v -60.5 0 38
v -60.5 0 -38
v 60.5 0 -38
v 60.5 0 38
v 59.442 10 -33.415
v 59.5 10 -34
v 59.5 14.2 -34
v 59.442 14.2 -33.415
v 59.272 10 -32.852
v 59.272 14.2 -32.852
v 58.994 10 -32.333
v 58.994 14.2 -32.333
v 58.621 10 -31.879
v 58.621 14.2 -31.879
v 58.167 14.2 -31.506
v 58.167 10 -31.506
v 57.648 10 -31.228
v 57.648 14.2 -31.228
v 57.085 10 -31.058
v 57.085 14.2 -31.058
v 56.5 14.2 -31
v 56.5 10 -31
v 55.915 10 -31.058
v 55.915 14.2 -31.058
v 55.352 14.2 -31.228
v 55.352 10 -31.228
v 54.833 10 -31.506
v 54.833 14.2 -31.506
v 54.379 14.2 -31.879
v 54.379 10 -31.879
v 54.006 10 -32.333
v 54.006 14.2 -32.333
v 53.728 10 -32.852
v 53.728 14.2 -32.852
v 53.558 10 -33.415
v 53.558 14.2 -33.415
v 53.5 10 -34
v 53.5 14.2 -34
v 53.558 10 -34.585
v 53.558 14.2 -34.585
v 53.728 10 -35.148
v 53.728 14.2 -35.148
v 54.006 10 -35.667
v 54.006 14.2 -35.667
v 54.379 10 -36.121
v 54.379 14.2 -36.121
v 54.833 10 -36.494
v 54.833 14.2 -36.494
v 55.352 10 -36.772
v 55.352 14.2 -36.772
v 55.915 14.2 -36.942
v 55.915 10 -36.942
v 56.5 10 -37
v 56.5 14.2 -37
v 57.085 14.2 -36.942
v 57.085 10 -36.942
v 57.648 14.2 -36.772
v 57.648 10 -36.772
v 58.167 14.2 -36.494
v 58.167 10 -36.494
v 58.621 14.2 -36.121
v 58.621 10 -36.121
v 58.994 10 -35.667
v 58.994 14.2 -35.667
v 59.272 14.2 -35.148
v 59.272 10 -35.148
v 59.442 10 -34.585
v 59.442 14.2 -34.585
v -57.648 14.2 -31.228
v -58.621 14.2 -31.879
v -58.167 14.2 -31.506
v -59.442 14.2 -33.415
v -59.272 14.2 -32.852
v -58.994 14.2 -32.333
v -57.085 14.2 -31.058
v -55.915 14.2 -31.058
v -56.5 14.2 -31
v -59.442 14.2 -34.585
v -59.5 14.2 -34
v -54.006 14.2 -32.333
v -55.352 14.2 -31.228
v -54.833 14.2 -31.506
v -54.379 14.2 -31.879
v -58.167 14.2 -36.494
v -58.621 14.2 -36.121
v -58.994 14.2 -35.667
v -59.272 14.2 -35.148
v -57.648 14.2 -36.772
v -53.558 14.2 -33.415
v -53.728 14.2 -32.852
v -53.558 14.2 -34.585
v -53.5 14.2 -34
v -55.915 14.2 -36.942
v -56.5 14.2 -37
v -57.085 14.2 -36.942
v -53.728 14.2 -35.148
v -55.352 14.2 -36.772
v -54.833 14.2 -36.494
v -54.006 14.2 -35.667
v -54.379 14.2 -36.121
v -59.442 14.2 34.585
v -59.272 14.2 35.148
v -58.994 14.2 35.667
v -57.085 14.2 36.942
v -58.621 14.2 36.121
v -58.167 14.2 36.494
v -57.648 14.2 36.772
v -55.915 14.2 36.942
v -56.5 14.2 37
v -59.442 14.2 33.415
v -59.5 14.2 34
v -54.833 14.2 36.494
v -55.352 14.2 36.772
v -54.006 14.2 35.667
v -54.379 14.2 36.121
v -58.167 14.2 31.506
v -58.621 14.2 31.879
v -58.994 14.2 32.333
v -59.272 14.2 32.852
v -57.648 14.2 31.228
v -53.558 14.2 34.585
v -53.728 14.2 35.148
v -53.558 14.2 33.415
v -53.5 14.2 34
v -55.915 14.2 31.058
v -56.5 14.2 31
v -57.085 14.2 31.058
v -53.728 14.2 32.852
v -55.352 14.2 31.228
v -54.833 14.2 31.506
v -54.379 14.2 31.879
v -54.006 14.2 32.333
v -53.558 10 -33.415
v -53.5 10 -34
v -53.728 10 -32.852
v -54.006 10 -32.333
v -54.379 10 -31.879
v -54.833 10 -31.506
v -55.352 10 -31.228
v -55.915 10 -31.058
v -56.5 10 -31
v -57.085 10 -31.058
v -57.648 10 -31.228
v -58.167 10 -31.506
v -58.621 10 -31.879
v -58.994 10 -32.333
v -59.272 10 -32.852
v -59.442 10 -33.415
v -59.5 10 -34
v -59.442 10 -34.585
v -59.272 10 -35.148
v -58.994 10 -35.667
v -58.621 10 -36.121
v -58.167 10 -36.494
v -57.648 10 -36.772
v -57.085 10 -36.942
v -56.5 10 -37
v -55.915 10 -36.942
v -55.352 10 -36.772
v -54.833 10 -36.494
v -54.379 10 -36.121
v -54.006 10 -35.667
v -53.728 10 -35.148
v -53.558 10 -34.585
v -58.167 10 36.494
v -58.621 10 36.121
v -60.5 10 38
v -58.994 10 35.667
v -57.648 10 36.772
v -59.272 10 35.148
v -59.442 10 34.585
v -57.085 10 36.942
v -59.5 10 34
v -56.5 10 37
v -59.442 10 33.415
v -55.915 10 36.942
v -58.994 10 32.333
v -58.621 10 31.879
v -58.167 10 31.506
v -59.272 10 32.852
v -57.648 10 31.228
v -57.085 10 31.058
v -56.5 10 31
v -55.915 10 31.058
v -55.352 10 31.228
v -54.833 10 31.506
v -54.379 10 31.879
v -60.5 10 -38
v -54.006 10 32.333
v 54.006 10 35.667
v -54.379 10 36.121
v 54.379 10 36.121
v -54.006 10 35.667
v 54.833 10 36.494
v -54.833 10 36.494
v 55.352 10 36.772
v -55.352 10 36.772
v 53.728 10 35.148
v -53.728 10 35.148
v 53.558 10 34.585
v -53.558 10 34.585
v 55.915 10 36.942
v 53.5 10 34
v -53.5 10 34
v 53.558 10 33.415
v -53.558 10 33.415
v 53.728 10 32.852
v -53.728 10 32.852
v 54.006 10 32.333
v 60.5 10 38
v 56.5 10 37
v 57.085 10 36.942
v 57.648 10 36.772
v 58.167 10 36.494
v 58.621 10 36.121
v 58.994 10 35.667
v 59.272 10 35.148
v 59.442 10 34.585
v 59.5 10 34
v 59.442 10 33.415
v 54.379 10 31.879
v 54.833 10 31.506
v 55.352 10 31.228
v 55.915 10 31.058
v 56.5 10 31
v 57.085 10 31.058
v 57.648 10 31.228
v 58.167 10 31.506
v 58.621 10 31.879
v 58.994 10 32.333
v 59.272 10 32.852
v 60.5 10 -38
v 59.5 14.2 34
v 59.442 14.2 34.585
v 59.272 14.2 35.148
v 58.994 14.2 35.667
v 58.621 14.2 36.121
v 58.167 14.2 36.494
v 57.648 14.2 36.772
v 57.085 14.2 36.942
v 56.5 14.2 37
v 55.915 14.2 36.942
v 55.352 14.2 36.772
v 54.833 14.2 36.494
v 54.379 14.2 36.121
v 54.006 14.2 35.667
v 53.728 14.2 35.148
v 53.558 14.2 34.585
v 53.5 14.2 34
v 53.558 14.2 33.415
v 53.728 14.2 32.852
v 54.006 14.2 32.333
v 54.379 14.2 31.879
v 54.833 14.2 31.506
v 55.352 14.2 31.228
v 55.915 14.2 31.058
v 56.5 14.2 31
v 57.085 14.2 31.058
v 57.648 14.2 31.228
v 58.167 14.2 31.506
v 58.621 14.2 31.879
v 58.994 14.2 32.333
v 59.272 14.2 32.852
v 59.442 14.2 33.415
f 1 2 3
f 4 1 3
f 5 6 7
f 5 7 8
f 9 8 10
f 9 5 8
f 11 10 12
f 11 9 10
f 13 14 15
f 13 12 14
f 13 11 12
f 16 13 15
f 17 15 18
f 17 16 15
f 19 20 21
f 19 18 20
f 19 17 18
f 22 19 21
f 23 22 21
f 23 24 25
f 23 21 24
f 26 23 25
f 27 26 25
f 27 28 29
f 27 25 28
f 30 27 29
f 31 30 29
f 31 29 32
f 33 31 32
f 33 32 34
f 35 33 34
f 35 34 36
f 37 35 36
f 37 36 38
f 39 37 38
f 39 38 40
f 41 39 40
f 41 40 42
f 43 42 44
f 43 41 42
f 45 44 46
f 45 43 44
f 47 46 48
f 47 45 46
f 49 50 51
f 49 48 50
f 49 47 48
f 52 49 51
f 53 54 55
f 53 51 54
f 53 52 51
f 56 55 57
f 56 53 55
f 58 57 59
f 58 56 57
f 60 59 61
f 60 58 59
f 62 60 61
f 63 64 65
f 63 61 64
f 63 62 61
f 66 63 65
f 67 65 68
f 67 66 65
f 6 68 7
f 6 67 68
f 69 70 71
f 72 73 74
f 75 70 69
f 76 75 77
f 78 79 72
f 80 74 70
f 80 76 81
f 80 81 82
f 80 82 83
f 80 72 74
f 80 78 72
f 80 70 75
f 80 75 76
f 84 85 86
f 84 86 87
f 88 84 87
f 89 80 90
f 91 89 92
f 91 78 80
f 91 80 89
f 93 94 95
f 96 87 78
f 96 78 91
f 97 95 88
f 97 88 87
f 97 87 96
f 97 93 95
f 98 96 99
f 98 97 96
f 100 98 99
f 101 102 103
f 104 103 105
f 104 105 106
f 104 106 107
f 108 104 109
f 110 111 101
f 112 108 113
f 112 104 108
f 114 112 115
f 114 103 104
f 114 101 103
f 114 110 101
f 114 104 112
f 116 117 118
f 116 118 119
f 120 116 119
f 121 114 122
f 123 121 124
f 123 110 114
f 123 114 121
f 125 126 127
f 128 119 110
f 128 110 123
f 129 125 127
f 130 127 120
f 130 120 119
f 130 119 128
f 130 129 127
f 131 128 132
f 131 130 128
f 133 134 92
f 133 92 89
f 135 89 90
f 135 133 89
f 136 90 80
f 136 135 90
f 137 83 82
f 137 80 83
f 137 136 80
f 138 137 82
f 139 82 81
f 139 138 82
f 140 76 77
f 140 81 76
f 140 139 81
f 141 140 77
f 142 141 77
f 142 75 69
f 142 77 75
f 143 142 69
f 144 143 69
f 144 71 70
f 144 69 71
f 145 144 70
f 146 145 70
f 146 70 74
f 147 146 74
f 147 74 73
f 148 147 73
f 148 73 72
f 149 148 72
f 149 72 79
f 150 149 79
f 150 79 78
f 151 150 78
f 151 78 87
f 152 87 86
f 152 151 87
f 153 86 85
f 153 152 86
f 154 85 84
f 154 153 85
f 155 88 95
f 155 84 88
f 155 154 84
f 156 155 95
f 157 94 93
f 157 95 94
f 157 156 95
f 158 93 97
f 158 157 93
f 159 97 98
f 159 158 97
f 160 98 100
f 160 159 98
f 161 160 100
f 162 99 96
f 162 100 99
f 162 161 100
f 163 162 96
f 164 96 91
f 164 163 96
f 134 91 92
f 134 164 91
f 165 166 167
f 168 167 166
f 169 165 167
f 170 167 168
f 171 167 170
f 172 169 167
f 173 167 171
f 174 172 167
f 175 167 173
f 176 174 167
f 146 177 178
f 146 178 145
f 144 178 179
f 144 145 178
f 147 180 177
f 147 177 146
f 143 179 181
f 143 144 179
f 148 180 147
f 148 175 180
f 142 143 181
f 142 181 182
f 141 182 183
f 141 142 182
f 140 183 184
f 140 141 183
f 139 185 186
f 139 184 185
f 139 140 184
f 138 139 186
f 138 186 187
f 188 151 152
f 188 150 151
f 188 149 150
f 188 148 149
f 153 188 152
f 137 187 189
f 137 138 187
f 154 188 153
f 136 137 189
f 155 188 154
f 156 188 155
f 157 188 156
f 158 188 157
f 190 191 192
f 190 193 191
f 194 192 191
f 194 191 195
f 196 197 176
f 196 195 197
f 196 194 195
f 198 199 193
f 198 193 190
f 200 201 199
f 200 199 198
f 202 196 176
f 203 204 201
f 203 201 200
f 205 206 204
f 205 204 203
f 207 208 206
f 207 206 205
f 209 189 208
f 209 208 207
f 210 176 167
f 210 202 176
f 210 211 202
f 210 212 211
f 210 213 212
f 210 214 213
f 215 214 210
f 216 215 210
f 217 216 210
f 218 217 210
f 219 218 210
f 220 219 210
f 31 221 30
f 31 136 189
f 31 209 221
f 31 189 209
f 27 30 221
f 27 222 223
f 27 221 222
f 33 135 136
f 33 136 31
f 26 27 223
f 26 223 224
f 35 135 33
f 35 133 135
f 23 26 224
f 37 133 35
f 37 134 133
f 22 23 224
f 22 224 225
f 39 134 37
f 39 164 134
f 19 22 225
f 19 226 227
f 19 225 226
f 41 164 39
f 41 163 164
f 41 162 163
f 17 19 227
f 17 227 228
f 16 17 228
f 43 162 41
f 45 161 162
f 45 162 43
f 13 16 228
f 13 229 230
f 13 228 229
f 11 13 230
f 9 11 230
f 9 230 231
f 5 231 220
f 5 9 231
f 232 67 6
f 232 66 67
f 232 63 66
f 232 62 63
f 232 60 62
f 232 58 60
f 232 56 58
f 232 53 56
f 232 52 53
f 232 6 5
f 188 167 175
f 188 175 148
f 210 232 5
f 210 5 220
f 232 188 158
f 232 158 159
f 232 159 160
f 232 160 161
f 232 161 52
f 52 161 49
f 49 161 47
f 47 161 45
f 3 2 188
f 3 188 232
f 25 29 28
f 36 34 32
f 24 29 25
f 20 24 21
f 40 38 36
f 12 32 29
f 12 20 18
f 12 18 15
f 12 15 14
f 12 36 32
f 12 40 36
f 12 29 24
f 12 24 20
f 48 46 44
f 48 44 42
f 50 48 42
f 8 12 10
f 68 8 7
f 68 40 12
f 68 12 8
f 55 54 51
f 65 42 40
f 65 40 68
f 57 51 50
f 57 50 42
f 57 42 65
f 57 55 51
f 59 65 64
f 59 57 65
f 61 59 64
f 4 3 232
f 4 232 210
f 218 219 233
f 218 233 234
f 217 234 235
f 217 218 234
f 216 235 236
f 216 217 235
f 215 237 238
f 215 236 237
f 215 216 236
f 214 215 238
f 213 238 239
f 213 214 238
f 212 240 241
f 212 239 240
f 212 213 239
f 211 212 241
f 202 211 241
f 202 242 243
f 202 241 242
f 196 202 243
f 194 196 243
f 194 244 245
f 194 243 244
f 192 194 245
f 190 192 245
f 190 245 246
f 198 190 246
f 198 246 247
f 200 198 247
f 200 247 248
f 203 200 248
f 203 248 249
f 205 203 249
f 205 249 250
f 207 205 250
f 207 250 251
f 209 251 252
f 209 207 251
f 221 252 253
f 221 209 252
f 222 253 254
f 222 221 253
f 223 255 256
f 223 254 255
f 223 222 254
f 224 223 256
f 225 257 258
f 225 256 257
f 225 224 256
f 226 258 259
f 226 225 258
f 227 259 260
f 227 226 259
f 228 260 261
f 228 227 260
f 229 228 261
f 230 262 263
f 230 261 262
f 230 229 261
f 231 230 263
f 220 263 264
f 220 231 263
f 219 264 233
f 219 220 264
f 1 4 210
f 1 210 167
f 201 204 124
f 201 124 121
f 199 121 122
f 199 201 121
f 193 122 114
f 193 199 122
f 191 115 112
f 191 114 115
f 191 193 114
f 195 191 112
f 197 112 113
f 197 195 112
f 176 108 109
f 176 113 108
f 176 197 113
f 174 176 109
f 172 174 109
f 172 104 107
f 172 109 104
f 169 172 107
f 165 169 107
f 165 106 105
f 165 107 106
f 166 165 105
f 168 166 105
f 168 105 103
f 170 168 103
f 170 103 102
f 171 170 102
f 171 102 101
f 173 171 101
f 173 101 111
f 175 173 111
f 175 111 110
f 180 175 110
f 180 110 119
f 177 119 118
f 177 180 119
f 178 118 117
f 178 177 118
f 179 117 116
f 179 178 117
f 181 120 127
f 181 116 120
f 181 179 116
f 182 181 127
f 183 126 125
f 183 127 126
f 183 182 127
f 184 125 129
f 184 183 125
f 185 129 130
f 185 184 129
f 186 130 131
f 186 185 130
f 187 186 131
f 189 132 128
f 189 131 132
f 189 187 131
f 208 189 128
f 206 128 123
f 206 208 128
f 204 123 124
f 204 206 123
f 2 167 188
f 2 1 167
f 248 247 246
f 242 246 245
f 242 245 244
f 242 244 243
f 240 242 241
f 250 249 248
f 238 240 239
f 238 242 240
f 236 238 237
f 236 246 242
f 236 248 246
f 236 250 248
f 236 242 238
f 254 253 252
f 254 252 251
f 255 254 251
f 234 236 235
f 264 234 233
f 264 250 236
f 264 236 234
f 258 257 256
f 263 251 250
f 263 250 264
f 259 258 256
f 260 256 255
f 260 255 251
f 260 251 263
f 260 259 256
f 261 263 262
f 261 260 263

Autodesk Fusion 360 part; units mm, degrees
sketch "Sketch1" plane through (0, 0, 0) normal (0, 1, 0) x (1, 0, 0)
  line L0 (60.5, -38) -> (-60.5, -38)
  line L1 (-60.5, -38) -> (-60.5, 38)
  line L2 (-60.5, 38) -> (60.5, 38)
  line L3 (60.5, 38) -> (60.5, -38)
  line L4 (60.5, -38) -> (-60.5, 38) construction
  line L5 (-60.5, -38) -> (60.5, 38) construction
  line L6 (56.5, -34) -> (-56.5, -34) construction
  line L7 (-56.5, -34) -> (-56.5, 34) construction
  line L8 (-56.5, 34) -> (56.5, 34) construction
  line L9 (56.5, 34) -> (56.5, -34) construction
  line L10 (56.5, -34) -> (-56.5, 34) construction
  line L11 (-56.5, -34) -> (56.5, 34) construction
  circle A0 centre (56.5, 34) radius 3
  circle A1 centre (56.5, -34) radius 3
  circle A2 centre (-56.5, -34) radius 3
  circle A3 centre (-56.5, 34) radius 3
  dimension "d1" = 121
  dimension "d2" = 76
  dimension "d3" = 113
  dimension "d4" = 68
  dimension "d5" = 6
  dimension "d6" = 6
  dimension "d7" = 6
  dimension "d8" = 6
extrude "Extrude1" add sketch "Sketch1" along normal blind 10
extrude "Extrude2" add sketch "Sketch1" along normal blind 14.2 contours A0 | A1 | A2 | A3
equation "d11 = 10 mm + 4.2 mm"
